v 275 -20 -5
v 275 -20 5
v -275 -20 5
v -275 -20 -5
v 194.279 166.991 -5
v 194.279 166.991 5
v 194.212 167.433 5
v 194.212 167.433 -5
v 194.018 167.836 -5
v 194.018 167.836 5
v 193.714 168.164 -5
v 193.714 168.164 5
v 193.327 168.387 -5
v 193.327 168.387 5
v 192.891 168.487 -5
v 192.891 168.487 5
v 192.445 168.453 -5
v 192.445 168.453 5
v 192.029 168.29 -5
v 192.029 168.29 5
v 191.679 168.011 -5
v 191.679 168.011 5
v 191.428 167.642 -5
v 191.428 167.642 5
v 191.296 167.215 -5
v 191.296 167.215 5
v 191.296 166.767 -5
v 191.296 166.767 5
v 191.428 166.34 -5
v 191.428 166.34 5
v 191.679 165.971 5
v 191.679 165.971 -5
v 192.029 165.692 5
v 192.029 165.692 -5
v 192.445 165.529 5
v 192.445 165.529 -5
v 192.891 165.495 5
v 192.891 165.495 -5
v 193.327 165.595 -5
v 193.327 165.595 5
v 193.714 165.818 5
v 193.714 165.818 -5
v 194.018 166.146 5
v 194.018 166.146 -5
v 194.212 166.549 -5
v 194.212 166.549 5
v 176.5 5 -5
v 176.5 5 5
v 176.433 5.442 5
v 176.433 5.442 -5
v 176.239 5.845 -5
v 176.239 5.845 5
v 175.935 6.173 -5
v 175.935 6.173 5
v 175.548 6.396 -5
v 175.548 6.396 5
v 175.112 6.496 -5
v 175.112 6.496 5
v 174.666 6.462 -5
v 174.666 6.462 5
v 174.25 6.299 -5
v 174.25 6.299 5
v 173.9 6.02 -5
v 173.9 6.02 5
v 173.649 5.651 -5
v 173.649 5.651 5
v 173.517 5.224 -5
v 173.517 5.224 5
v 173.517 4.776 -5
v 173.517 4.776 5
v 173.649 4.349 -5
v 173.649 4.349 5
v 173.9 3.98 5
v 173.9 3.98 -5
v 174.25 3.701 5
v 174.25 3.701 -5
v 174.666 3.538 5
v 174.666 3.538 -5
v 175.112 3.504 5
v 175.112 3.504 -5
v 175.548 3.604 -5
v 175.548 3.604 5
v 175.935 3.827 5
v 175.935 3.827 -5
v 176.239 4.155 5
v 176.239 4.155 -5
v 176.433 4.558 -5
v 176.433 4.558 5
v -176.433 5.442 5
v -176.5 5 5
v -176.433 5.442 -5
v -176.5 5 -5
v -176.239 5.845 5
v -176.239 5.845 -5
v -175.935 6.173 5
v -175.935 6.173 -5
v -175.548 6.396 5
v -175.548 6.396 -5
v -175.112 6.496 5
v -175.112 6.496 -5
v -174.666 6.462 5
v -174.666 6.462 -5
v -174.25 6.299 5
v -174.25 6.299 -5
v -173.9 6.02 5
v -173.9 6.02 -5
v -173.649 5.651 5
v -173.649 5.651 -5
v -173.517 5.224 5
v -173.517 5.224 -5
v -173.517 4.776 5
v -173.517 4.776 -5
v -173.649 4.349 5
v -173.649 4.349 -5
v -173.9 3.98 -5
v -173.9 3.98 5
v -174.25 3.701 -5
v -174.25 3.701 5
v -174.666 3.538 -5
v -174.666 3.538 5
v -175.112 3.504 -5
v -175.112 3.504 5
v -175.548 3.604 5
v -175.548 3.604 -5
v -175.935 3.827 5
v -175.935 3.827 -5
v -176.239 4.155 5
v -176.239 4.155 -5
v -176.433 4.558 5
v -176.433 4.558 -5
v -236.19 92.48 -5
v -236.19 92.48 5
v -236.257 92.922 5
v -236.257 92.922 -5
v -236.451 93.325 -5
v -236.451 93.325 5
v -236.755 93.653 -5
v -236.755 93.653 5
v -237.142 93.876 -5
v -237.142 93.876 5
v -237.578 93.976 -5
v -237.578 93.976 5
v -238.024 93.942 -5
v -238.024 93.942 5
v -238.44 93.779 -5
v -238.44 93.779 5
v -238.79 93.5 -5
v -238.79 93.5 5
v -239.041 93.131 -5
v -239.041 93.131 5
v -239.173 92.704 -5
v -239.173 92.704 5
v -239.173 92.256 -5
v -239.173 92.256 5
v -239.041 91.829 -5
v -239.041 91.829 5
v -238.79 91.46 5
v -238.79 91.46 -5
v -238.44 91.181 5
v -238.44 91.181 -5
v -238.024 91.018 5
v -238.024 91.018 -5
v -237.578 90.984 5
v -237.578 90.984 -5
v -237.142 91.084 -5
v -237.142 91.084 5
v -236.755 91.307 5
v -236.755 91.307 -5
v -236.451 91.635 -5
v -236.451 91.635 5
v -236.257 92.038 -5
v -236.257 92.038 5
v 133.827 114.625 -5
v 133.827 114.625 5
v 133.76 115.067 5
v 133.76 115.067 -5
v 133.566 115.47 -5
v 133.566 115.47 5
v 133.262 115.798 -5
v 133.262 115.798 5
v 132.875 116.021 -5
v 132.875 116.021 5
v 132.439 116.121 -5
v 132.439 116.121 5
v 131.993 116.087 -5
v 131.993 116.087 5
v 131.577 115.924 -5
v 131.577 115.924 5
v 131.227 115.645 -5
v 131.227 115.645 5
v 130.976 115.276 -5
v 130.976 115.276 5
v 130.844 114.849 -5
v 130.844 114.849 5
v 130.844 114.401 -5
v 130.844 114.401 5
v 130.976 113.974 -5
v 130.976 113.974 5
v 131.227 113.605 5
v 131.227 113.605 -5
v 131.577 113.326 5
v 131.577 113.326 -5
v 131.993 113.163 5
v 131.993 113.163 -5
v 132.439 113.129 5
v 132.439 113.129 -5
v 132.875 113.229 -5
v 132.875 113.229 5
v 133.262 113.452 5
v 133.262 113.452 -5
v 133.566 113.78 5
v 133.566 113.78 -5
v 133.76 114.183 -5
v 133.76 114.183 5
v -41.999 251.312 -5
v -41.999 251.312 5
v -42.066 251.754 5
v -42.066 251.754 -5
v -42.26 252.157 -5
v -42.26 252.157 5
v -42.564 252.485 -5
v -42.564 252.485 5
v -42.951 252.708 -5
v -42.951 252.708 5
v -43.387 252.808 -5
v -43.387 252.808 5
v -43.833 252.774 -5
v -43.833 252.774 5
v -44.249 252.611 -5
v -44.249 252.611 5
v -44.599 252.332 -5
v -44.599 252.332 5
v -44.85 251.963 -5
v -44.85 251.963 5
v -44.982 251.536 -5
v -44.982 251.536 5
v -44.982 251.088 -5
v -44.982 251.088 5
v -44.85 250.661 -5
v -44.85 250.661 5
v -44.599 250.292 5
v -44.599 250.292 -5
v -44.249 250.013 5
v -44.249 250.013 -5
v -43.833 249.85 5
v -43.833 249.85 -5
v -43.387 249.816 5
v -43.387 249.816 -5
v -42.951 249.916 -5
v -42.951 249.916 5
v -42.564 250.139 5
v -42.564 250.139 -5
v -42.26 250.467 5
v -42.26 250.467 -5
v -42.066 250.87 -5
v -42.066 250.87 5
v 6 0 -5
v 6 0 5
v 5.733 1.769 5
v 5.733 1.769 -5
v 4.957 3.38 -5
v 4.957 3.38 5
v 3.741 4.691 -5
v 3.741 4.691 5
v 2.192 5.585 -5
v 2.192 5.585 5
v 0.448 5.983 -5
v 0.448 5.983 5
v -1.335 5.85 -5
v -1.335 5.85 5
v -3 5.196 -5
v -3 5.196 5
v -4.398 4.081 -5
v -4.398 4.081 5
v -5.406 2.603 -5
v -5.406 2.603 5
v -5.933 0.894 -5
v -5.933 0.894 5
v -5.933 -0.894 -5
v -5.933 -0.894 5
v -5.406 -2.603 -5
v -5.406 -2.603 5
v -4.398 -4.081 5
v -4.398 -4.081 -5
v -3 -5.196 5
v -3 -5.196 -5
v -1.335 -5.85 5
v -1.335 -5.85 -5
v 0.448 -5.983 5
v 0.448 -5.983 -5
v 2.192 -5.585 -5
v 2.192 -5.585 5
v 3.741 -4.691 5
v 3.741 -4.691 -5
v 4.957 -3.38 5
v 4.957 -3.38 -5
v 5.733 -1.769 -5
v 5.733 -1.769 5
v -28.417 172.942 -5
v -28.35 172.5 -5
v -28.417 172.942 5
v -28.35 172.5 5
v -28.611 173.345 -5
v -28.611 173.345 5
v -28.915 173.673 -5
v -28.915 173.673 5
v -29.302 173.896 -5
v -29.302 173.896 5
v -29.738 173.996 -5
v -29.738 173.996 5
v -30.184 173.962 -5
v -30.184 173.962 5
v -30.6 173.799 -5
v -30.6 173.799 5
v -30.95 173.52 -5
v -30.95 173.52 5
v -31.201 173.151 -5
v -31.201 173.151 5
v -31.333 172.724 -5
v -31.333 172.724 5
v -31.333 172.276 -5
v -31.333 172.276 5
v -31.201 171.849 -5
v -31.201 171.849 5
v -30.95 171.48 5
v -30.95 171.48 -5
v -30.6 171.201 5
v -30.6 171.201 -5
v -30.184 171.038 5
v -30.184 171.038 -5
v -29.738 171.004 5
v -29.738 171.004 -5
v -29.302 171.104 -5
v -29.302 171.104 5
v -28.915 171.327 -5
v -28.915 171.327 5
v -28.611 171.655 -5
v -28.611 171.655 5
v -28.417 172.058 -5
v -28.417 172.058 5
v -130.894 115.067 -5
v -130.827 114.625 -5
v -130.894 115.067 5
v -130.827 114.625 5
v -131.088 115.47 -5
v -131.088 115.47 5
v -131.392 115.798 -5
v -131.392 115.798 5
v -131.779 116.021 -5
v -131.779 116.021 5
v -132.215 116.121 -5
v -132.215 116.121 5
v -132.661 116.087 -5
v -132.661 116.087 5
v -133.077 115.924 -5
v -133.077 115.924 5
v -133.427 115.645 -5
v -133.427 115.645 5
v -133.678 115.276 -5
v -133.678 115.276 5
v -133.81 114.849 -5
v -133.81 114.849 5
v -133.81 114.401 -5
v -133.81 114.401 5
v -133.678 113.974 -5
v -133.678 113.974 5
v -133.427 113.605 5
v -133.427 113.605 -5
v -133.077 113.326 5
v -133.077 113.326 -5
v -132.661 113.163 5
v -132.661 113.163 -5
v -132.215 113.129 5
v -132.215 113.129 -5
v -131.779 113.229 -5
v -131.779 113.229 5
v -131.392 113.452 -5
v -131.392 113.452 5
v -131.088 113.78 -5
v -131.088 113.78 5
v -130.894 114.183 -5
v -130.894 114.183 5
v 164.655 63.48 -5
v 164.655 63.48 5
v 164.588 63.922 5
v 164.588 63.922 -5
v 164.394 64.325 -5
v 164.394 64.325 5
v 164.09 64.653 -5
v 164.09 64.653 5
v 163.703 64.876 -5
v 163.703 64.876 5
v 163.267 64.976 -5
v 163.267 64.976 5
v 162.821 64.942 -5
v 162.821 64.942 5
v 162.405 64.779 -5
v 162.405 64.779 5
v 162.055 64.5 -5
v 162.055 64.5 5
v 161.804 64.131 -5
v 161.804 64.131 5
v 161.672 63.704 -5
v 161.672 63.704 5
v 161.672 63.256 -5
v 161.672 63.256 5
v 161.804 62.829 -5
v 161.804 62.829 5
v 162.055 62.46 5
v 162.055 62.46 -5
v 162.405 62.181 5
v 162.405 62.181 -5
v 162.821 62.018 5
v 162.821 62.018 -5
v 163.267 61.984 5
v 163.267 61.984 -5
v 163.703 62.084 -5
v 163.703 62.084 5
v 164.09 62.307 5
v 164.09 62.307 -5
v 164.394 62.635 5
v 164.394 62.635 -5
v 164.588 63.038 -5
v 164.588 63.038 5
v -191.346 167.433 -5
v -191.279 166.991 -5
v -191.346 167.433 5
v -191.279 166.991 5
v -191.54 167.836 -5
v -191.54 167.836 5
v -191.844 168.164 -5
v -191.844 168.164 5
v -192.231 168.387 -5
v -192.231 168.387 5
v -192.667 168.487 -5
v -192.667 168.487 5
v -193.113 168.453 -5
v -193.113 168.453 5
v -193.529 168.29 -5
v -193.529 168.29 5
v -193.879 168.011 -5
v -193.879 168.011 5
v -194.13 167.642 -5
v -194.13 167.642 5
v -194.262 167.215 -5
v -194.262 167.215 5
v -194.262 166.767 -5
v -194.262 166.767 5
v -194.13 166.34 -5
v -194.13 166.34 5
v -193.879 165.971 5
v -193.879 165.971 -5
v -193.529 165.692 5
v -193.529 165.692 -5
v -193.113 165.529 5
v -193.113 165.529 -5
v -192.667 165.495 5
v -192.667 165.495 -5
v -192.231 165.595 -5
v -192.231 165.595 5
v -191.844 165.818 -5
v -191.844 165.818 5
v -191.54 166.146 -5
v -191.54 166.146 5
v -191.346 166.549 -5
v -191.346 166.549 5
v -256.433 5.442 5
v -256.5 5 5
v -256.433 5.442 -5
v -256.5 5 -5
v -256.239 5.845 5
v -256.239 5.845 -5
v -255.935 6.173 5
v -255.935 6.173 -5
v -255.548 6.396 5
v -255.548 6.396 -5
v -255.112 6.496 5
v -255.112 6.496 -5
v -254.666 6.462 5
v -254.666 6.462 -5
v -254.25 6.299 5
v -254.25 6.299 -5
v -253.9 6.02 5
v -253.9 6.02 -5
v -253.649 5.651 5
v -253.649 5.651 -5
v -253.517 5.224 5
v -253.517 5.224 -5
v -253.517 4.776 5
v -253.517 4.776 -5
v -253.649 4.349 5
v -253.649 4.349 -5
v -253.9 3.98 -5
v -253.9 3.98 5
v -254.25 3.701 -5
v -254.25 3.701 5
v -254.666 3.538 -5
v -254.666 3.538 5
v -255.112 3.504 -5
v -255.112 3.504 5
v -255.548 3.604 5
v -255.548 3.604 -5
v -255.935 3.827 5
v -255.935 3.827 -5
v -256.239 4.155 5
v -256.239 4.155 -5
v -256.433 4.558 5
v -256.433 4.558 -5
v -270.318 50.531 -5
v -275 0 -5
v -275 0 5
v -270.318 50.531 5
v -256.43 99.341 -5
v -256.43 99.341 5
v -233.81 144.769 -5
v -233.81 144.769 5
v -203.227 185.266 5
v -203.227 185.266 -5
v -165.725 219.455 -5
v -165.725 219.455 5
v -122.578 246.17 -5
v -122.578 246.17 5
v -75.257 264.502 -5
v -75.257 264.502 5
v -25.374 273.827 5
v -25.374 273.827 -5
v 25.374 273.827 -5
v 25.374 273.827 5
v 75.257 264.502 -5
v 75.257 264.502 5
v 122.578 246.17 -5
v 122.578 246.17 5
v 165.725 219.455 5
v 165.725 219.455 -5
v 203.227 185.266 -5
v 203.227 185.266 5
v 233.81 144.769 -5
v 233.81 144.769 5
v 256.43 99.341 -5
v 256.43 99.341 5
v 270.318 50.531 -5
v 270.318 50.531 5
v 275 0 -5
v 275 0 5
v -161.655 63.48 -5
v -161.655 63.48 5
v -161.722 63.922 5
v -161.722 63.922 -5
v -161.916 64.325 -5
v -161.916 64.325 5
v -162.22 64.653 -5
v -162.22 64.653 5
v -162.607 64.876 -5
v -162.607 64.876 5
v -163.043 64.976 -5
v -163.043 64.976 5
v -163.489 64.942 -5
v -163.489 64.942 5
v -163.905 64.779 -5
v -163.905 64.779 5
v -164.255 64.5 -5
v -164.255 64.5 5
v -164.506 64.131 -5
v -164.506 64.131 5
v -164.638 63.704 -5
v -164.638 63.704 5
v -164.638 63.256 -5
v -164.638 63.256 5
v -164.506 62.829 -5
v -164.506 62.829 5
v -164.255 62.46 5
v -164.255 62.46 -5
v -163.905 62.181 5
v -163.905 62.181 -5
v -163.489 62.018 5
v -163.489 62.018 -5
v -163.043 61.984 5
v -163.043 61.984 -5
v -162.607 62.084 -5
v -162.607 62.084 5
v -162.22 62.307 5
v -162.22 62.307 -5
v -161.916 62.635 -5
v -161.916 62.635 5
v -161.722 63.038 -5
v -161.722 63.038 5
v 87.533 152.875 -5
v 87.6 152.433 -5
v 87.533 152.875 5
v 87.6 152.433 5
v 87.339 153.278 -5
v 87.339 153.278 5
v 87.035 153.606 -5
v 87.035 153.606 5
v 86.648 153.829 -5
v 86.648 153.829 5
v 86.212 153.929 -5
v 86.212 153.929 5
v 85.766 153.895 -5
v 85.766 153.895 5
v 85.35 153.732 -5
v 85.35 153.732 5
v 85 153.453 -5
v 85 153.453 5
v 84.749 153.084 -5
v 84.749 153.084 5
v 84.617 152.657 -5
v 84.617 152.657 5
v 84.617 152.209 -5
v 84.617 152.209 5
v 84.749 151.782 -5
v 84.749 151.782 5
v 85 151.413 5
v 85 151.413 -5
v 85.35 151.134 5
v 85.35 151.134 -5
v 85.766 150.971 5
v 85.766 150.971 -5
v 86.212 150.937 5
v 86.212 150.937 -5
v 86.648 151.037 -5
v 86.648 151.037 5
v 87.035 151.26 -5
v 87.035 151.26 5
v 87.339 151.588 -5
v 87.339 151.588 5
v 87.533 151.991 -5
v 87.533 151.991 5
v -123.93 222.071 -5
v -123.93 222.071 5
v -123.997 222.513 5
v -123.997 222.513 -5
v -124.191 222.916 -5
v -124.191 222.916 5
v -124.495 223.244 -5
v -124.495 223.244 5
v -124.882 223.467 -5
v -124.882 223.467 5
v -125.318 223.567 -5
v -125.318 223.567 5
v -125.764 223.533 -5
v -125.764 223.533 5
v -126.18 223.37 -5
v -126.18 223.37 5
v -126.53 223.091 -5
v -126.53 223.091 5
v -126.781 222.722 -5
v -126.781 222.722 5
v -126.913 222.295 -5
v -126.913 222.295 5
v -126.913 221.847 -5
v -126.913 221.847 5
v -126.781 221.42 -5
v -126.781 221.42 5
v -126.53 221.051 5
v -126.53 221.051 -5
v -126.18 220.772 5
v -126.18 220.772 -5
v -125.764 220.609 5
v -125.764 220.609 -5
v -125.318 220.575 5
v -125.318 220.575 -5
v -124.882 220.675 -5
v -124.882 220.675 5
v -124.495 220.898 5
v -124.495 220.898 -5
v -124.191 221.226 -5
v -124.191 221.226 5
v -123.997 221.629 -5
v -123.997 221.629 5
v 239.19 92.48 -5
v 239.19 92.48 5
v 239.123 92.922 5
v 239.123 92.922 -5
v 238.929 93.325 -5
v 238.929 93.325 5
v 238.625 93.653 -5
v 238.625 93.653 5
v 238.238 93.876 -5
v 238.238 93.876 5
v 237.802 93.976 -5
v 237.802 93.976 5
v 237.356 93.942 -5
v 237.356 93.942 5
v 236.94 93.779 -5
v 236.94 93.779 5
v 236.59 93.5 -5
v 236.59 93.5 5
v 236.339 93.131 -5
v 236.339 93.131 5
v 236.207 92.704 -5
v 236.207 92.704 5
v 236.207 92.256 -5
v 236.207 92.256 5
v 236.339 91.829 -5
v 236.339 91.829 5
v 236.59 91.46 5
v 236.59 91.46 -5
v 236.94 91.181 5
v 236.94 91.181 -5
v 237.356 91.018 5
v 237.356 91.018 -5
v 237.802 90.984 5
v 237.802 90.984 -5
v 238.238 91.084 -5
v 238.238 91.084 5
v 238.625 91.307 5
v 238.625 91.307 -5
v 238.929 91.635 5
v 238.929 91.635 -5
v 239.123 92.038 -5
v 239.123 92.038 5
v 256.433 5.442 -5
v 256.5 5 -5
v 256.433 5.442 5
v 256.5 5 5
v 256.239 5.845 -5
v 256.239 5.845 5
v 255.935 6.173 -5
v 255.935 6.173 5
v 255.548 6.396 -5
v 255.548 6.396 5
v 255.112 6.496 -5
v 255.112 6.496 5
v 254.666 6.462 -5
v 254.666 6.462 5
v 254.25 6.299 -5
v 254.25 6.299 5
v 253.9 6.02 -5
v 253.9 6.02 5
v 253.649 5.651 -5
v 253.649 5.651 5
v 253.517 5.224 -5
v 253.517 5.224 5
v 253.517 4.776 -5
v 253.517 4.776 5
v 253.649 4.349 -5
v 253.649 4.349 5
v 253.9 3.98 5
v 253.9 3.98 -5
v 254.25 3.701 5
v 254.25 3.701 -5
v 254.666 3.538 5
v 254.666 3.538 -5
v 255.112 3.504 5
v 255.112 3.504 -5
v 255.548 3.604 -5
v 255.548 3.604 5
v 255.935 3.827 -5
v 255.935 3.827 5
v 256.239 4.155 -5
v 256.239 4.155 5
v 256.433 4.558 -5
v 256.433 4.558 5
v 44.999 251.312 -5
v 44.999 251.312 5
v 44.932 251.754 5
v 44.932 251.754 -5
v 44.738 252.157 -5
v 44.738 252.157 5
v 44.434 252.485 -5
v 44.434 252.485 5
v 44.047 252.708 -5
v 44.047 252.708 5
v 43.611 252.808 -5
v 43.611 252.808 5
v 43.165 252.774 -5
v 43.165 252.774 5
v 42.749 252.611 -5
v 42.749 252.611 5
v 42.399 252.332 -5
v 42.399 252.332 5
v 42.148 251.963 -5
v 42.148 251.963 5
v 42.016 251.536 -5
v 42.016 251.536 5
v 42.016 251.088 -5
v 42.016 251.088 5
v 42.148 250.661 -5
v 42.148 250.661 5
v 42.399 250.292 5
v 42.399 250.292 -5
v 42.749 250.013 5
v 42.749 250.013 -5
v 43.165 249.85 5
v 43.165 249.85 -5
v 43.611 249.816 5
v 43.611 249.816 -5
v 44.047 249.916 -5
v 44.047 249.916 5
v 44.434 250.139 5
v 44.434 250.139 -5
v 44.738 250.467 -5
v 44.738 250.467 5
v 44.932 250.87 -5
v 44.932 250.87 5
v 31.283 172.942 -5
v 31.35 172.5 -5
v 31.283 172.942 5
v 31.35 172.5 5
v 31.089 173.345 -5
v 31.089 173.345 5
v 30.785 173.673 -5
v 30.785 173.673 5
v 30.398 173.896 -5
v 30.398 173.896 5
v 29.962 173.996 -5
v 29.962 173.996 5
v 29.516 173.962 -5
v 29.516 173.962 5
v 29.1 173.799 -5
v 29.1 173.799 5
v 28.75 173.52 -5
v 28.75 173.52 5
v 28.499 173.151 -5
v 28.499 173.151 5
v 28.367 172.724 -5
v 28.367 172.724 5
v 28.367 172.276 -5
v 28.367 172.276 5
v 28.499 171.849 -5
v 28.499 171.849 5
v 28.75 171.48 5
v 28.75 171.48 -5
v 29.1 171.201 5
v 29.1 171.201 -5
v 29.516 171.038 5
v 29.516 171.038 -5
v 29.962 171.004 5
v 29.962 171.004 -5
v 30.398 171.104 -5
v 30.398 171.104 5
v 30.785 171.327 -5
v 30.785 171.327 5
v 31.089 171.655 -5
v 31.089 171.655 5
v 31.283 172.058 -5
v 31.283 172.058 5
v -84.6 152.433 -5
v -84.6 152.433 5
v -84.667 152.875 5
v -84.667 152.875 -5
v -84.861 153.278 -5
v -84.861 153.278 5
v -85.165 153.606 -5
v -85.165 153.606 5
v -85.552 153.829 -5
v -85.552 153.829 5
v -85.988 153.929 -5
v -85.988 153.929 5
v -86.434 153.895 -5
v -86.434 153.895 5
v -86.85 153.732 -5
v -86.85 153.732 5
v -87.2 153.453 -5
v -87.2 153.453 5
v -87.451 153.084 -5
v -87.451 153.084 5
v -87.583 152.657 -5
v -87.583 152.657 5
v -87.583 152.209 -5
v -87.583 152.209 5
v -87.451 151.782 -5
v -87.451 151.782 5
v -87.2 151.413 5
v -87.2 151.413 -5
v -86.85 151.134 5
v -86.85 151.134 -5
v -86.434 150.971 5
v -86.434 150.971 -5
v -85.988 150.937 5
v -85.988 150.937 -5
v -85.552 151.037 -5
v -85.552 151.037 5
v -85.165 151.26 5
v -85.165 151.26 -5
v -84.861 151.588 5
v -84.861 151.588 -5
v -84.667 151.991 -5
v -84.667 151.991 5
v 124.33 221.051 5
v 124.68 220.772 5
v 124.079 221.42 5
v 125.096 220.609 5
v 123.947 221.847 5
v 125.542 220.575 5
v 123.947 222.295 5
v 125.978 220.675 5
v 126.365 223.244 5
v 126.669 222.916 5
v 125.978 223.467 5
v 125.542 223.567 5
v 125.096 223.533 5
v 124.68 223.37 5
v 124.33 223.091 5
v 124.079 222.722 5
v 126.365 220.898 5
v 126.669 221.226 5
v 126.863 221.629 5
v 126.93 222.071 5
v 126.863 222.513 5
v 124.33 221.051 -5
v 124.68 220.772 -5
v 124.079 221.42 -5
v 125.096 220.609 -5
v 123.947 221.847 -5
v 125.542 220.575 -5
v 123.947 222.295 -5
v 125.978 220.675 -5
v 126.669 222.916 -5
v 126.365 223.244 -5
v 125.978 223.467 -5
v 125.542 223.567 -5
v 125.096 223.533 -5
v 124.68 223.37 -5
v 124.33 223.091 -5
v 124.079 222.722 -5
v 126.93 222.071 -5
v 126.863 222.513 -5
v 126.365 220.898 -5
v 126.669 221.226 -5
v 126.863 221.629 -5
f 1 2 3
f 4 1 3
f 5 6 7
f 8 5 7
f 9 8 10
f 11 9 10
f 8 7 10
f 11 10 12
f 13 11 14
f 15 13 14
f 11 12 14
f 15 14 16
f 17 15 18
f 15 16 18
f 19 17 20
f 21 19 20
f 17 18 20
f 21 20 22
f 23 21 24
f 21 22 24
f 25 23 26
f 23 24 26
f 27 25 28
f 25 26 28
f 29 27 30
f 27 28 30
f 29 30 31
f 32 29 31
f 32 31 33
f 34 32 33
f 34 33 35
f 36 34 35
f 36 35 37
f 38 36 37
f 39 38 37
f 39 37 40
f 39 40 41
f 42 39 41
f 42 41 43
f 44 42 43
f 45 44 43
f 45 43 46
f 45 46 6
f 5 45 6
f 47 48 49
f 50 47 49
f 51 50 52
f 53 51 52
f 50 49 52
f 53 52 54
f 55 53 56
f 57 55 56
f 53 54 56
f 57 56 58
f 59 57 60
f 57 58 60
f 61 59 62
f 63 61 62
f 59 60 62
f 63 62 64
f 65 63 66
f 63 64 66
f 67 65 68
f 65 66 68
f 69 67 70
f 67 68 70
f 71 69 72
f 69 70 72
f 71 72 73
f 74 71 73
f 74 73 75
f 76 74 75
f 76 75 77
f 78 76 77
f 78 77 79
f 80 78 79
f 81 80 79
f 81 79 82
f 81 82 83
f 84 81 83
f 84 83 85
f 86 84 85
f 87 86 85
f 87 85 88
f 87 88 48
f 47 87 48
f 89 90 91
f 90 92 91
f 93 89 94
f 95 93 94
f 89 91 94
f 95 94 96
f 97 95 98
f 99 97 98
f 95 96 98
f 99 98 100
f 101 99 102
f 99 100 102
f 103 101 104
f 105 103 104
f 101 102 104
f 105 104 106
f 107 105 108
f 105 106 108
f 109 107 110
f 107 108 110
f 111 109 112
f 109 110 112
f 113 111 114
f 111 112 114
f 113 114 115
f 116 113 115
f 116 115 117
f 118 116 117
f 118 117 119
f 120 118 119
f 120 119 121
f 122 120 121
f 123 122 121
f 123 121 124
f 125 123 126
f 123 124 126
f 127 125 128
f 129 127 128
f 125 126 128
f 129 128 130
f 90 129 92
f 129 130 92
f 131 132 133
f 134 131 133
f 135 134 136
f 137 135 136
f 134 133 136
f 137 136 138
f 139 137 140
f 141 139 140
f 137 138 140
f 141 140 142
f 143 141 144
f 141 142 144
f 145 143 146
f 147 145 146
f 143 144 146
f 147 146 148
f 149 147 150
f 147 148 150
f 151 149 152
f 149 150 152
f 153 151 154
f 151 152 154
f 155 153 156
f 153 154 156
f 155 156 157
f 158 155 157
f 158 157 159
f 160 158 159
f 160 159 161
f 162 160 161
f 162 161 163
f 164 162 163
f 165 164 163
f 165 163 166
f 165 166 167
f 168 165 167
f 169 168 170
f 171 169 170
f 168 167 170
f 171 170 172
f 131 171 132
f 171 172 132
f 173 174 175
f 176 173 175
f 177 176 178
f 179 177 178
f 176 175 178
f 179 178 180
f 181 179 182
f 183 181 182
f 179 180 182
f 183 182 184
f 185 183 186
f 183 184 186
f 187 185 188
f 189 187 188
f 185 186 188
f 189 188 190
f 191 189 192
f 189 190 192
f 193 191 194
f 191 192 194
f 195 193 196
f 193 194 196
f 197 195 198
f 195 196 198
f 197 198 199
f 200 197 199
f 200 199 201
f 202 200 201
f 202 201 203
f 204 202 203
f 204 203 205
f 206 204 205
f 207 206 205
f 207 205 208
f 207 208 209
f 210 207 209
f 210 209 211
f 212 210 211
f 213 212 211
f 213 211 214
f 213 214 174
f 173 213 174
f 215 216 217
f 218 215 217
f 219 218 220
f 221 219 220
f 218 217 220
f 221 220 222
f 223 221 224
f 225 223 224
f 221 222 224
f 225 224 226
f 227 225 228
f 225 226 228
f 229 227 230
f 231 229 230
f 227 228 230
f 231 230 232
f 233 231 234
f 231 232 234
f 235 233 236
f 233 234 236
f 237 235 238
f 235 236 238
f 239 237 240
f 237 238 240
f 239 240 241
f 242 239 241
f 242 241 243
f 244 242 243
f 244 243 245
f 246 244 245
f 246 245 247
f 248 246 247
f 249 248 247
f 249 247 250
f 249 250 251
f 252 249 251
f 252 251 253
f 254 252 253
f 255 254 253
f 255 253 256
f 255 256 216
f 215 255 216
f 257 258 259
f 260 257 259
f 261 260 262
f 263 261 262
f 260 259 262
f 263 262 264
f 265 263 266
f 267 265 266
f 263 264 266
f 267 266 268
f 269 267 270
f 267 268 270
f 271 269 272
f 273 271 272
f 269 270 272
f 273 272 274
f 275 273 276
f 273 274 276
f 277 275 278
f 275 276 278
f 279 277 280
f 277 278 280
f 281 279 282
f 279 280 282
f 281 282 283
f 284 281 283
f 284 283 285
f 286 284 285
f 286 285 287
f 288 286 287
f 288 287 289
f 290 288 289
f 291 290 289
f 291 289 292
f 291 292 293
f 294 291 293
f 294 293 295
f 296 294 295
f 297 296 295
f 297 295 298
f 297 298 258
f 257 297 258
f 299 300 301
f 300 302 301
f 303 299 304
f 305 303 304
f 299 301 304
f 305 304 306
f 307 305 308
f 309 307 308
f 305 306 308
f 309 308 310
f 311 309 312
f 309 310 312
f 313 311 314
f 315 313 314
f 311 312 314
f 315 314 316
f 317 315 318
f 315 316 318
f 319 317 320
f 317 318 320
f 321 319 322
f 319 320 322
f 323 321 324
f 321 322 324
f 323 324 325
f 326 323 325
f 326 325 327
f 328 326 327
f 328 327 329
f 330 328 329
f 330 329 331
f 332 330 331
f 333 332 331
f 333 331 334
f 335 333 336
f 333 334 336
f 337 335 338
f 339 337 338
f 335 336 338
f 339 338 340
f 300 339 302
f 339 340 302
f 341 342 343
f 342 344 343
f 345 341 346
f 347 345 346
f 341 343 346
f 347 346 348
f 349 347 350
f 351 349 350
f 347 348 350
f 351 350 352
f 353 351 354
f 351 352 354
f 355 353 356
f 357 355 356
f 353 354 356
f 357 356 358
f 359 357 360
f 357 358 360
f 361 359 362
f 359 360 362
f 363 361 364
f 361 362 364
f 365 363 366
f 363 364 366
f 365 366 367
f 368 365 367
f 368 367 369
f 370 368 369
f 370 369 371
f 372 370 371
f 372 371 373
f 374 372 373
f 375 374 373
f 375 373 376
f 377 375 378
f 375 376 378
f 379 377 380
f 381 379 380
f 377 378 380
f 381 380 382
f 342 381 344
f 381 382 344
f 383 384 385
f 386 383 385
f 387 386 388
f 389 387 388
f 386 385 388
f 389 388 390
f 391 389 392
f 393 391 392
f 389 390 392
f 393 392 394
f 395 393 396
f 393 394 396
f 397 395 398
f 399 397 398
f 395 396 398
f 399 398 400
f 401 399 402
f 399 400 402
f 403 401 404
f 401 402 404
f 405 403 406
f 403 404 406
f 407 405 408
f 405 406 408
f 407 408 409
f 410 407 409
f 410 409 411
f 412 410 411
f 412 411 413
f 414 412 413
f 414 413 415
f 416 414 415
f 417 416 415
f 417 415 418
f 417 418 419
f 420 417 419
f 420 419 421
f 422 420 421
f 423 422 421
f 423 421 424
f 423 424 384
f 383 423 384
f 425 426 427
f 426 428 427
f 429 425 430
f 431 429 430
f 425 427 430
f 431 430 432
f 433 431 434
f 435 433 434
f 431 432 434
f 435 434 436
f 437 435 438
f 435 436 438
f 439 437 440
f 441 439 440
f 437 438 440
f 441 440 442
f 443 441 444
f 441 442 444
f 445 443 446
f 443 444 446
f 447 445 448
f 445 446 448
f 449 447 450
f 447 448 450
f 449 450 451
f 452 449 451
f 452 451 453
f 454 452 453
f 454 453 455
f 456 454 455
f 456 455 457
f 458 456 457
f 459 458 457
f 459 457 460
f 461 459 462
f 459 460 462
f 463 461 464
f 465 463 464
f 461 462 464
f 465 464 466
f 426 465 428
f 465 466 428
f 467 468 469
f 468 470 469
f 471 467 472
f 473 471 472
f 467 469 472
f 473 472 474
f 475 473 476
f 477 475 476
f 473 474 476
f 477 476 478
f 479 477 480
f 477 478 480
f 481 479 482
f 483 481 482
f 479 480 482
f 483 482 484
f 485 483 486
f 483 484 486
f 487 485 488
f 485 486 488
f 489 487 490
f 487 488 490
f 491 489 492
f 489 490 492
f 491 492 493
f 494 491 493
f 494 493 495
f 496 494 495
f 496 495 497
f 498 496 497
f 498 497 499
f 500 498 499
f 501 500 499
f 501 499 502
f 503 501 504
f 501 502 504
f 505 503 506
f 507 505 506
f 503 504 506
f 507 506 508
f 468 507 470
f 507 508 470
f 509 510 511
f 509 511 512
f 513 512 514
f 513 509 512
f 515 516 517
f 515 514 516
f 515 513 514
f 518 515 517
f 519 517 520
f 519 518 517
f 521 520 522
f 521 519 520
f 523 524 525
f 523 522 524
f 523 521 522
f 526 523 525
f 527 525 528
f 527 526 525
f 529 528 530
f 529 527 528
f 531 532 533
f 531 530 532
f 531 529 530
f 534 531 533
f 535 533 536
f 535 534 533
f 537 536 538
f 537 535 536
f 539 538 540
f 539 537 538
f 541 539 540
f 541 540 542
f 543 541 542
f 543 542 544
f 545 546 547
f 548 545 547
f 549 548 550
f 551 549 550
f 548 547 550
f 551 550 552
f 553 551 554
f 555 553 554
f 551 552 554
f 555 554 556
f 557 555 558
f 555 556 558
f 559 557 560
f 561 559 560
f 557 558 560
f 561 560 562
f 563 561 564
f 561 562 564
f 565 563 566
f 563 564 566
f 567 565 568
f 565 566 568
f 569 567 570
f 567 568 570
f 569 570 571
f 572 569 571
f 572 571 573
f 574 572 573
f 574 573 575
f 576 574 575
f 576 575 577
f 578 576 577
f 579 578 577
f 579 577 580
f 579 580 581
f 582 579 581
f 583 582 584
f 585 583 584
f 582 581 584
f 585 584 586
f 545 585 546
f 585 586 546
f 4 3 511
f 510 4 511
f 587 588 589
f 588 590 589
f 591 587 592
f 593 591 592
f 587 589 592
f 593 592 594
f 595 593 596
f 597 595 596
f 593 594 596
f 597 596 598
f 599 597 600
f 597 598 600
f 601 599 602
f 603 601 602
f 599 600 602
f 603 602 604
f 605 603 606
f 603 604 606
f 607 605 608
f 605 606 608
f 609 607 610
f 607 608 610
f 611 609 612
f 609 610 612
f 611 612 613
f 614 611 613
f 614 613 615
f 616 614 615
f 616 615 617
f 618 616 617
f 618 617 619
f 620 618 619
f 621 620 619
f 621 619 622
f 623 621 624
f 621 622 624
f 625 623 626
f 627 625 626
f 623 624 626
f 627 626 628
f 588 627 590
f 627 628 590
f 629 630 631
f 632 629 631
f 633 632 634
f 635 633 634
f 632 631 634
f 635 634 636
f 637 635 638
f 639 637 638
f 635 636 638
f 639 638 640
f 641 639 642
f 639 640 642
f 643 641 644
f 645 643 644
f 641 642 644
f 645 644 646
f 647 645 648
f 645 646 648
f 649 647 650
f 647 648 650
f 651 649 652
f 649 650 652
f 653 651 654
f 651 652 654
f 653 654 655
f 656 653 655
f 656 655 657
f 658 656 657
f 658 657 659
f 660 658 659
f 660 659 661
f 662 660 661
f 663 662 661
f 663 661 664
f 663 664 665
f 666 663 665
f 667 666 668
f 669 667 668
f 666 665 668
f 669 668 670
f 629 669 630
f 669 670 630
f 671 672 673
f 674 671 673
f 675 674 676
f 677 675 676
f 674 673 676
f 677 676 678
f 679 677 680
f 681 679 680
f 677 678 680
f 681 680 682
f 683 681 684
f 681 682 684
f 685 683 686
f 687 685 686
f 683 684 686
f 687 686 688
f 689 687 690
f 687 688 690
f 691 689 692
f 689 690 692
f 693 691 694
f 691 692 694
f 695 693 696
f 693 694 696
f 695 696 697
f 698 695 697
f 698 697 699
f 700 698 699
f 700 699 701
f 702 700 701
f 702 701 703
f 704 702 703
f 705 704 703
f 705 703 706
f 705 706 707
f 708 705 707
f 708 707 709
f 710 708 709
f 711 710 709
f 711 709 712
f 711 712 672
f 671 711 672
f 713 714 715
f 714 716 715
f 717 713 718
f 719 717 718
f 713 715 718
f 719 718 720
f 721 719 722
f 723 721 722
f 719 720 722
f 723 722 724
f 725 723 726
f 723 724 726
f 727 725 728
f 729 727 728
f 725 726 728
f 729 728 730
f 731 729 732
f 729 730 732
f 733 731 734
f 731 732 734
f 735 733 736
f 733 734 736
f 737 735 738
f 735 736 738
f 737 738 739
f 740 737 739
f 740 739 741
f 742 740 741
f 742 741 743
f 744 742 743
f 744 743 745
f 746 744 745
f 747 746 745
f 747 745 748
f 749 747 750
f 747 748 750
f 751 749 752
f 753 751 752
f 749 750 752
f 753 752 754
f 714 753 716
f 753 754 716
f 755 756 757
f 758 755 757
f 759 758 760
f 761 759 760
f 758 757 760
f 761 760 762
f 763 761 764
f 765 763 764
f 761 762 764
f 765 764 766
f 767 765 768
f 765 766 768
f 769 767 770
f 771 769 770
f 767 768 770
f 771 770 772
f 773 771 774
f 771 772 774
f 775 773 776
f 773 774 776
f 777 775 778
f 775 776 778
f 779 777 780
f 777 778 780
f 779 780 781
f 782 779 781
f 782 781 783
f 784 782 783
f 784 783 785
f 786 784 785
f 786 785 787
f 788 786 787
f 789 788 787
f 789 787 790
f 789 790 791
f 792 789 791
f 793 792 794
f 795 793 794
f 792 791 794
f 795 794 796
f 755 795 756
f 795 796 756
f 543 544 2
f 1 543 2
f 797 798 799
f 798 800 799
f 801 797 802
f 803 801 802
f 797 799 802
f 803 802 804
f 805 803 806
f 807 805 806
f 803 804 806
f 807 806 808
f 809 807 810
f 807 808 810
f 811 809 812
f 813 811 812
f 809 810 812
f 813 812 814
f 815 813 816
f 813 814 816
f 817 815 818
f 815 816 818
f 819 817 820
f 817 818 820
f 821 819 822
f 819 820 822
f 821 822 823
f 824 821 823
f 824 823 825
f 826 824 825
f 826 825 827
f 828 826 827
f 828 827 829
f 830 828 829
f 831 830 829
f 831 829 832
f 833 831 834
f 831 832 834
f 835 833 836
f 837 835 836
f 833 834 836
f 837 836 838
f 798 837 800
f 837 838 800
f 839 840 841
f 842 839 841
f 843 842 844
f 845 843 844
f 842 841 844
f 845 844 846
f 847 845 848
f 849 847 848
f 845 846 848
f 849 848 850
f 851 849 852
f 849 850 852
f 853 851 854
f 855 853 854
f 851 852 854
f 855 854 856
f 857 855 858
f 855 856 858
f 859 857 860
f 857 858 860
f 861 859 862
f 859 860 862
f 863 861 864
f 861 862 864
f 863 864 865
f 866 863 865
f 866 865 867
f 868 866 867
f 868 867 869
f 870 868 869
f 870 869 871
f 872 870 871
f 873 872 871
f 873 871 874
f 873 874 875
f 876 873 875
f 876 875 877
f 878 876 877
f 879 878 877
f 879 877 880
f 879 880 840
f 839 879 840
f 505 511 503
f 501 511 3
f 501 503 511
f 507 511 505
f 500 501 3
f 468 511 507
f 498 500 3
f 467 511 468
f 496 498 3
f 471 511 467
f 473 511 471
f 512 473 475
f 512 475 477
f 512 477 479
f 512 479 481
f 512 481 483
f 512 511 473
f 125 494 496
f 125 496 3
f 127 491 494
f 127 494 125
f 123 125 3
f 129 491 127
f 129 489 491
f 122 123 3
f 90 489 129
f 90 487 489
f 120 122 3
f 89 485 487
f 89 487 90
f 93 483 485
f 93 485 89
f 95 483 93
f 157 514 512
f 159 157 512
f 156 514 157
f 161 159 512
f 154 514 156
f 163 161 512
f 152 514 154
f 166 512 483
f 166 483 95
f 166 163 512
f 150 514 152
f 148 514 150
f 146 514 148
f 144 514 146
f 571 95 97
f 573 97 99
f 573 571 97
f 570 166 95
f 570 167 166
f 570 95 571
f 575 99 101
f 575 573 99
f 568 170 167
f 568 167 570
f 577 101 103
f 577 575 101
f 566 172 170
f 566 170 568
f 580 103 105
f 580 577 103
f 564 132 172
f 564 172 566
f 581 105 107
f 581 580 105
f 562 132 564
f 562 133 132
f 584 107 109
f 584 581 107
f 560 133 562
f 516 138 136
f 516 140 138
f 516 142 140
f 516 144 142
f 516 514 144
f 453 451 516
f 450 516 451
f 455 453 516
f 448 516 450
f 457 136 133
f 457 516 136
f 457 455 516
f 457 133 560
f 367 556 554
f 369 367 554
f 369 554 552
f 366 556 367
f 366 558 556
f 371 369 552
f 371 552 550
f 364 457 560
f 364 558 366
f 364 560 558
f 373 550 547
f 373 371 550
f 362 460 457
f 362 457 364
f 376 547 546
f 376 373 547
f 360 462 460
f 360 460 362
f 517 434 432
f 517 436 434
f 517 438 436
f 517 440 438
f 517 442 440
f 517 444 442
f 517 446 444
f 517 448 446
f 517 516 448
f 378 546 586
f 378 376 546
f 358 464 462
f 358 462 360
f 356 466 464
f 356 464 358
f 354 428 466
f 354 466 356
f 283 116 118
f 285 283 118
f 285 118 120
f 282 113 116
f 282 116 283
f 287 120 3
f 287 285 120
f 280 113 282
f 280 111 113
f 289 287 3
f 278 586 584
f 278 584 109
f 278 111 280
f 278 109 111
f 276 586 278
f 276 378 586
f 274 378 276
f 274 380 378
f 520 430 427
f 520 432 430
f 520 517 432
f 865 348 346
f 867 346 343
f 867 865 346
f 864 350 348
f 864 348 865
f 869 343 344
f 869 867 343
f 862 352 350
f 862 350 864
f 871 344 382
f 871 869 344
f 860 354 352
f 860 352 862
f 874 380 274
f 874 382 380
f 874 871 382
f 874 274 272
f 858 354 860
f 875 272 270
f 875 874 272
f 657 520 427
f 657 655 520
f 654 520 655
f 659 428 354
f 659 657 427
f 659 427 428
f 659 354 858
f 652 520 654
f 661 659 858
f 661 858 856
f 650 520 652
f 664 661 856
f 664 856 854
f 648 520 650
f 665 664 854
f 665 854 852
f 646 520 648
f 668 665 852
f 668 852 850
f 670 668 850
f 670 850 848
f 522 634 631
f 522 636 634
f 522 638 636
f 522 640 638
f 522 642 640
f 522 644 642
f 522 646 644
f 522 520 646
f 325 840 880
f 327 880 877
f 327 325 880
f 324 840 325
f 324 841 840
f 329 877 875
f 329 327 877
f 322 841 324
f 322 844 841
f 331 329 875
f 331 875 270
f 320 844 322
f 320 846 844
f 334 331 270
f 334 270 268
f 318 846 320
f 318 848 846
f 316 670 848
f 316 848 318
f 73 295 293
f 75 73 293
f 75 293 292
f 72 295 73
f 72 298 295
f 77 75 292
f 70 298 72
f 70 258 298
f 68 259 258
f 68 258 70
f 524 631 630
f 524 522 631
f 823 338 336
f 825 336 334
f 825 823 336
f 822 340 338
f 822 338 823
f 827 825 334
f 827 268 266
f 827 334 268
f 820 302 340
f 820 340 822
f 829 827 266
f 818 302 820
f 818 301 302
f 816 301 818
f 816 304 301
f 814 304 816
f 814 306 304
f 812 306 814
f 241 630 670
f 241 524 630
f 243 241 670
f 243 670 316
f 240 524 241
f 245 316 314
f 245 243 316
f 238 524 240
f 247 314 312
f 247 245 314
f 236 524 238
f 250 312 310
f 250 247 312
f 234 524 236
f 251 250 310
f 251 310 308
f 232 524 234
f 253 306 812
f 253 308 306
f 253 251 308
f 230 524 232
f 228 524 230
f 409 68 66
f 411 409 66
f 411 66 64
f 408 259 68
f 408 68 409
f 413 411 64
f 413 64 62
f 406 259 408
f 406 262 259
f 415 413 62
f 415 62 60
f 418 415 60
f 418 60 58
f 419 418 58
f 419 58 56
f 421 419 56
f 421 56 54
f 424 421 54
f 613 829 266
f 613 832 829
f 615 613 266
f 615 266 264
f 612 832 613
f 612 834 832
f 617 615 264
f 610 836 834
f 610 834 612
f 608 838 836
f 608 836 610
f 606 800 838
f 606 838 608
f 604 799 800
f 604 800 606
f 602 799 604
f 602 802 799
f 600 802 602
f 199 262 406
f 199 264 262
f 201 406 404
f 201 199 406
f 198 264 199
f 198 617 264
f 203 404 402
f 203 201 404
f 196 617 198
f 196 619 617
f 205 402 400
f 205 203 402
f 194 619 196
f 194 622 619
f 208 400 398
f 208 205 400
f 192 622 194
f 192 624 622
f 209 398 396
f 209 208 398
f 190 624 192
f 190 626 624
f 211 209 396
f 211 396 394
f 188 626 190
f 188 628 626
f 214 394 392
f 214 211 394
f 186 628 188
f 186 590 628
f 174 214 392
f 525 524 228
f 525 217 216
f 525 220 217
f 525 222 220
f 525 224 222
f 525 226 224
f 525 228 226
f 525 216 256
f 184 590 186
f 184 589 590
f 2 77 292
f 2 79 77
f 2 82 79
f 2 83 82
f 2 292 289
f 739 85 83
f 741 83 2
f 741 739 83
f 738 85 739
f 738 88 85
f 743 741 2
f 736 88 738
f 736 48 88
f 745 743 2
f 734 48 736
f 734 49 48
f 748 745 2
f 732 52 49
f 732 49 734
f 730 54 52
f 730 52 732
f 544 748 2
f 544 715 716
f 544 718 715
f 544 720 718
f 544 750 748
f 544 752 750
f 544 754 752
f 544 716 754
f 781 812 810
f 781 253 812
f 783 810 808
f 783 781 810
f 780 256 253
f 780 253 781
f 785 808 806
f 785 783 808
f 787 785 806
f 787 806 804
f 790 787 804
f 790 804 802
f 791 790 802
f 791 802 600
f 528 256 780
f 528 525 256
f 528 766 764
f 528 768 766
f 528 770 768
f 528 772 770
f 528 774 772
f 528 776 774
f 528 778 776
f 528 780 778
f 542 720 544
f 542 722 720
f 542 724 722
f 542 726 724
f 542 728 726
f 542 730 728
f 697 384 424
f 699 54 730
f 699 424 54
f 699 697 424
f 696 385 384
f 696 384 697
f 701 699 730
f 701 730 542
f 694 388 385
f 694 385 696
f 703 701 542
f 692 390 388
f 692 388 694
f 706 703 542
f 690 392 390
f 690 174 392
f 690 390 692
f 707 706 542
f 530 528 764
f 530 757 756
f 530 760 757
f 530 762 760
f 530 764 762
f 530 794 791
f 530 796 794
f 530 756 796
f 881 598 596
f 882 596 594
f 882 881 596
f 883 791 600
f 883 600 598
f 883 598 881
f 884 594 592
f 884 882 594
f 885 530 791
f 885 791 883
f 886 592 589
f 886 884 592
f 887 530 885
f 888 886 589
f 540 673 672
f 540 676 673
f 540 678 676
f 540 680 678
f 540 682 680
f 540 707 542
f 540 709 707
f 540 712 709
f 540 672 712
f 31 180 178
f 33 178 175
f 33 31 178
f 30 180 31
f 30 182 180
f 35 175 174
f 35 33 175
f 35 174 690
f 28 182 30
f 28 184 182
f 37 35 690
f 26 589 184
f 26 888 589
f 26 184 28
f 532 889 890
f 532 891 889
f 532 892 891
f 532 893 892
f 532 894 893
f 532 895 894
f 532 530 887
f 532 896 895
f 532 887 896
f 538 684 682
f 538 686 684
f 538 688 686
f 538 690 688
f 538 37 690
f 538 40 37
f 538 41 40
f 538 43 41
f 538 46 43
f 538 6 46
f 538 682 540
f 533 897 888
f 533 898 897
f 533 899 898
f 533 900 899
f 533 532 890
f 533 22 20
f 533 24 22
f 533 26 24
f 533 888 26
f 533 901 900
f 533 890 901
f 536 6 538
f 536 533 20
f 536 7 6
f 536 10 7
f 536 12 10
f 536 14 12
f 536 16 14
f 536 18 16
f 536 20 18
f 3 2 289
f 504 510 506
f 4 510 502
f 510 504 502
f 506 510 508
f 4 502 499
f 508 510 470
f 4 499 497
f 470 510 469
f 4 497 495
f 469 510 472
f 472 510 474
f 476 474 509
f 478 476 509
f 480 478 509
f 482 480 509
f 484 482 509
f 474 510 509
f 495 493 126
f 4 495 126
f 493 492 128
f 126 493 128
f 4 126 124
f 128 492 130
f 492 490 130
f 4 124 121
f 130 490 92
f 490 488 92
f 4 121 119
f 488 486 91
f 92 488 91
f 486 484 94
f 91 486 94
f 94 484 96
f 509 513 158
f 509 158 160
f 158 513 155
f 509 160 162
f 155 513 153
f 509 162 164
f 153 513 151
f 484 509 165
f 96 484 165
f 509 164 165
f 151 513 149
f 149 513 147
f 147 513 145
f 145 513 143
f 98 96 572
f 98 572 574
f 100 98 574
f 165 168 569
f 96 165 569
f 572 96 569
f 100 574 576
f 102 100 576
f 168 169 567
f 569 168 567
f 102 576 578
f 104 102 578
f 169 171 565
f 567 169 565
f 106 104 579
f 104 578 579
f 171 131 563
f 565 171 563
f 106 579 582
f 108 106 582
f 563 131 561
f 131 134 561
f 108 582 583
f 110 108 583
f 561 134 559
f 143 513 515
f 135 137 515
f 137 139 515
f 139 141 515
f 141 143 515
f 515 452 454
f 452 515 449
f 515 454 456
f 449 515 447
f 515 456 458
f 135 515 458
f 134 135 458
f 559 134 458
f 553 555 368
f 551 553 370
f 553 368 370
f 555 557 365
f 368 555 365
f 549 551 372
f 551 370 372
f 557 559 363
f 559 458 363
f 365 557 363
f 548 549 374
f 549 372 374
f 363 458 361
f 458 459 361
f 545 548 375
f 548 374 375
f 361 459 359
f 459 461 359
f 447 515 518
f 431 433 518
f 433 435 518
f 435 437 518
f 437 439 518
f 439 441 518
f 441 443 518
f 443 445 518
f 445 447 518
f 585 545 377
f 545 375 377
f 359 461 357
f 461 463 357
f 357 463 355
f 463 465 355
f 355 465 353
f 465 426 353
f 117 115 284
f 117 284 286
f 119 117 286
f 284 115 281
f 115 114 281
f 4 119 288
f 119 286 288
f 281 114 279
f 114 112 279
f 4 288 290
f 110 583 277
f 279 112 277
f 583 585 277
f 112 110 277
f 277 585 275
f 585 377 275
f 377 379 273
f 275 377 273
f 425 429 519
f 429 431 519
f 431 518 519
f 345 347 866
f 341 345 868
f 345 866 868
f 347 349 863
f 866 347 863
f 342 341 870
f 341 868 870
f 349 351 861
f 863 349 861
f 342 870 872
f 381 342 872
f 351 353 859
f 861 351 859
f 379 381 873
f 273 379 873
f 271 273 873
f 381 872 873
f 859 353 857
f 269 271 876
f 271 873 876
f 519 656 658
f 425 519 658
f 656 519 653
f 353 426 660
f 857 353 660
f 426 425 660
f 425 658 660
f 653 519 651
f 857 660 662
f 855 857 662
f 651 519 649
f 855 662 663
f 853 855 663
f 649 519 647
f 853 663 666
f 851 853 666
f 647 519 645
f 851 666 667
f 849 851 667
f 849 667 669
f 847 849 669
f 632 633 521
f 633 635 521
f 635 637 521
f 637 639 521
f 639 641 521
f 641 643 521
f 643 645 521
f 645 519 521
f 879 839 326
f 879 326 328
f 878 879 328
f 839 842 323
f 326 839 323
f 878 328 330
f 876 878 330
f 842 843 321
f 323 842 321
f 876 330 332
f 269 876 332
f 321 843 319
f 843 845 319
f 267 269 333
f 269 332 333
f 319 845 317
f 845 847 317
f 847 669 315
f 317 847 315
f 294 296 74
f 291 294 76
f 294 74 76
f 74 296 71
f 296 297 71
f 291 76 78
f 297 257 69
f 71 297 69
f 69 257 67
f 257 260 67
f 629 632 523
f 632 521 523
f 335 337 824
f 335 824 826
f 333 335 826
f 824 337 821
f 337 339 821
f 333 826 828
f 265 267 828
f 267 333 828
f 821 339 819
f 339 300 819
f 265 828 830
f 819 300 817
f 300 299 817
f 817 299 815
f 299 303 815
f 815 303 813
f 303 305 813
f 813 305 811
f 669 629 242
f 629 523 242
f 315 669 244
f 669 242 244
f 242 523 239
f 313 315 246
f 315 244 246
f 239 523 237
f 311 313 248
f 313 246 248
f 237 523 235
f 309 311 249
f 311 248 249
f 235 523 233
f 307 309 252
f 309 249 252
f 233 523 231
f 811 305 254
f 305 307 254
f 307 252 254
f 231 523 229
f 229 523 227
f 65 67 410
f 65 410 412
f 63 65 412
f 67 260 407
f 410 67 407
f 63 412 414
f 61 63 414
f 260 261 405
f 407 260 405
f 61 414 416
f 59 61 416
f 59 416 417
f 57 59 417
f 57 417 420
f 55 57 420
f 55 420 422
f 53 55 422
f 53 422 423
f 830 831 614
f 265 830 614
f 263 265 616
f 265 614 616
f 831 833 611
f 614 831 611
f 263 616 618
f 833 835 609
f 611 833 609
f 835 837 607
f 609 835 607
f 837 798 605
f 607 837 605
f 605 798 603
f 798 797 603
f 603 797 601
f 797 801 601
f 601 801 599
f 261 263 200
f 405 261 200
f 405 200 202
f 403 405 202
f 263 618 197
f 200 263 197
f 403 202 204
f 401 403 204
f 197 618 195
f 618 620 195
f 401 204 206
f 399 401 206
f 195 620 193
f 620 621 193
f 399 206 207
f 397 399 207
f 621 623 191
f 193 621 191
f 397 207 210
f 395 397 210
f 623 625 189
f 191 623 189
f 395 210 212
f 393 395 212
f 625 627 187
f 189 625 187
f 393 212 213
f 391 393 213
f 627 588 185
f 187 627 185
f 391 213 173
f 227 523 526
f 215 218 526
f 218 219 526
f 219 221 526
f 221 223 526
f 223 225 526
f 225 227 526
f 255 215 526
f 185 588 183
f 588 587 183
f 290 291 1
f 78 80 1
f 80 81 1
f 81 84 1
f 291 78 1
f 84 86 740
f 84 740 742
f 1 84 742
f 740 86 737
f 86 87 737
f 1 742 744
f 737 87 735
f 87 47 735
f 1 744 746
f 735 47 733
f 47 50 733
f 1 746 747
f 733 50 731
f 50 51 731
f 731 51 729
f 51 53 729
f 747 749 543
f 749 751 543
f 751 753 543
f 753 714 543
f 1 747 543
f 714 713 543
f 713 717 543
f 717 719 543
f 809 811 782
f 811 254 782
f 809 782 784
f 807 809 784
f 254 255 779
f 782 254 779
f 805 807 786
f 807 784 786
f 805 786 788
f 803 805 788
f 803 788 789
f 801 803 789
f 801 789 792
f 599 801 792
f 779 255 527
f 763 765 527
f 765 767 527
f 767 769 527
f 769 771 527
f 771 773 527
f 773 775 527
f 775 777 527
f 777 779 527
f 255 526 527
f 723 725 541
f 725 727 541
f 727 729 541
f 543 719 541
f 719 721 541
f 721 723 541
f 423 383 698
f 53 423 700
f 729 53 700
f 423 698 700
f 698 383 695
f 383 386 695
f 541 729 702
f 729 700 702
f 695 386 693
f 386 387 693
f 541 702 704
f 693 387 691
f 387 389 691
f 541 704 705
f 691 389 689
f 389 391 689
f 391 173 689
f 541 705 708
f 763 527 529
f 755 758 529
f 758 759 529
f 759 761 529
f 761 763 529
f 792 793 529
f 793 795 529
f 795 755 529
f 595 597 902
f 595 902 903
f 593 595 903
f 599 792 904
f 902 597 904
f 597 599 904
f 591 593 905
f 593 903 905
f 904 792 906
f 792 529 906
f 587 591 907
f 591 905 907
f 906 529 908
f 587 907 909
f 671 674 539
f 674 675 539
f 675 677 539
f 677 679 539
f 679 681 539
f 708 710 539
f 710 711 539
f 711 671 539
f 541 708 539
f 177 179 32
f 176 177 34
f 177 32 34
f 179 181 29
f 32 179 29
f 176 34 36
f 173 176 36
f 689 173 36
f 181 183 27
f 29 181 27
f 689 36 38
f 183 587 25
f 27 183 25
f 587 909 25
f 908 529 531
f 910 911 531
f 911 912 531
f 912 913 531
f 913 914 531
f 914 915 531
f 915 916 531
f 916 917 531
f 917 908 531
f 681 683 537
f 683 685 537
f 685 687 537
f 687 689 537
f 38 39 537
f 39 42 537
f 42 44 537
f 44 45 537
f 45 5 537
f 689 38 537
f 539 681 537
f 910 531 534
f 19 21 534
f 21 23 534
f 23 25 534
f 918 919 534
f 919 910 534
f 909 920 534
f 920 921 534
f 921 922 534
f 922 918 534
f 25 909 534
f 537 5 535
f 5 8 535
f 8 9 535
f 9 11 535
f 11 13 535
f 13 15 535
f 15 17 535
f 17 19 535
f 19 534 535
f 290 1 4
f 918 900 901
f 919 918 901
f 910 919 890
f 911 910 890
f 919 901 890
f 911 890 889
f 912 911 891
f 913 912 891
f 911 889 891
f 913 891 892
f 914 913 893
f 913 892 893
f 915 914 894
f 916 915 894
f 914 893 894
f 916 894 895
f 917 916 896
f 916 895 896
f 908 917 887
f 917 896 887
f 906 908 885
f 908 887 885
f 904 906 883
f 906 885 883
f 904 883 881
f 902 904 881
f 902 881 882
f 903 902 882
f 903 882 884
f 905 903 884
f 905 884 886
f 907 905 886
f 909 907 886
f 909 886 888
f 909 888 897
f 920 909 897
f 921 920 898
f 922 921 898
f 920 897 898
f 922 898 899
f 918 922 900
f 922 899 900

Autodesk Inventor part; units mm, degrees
ref_plane "YZ Plane" through (0, 0, 0) normal (1, 0, 0) x (0, 1, 0)
ref_plane "XZ Plane" through (0, 0, 0) normal (0, 1, 0) x (-1, 0, 0)
ref_plane "XY Plane" through (0, 0, 0) normal (0, 0, 1) x (1, 0, 0)
sketch "Esquisse1" plane through (0, 0, 0) normal (0, 0, 1) x (1, 0, 0)
  circle A0 centre (0, 0) radius 155
  circle A1 centre (0, 0) radius 275
  line L0 (-275, 0) -> (275, 0)
  line L1 (-155, 0) -> (155, 0)
  circle A2 centre (-175, 5) radius 1.5
  circle A3 centre (175, 5) radius 1.5
  point P0 (-86.6478, -260.9927)
  point P1 (93.3373, -258.6758)
  dimension "d0" = 310
  dimension "d1" = 550
  dimension "d2" = 180
  dimension "d5" = 179.9851
  dimension "d6" = 5
  dimension "d7" = -175
  dimension "d8" = 3
  dimension "d19" = 5
  dimension "d20" = 175
  dimension "d21" = 3
extrude "Extrusion1" add sketch "Esquisse1" along normal mid plane 10 contours L0 A0 | A0 L0 A1 | A2 | A3 picked at (36.5339, 36.5339) picked at (197.6975, 36.6731)
sketch "Esquisse2" plane through (0, 0, 5) normal (0, 0, 1) x (-1, 0, 0)
  arc A0 (-275, 0) -> (275, 0) centre (0, 0) ccw projected
  line L0 (-275, 0) -> (275, 0)
sketch "Esquisse3" plane through (0, 0, -5) normal (0, 0, -1) x (-1, 0, 0)
  circle A0 centre (175, 5) radius 1.5
  line L0 (275, 0) -> (-275, 0) projected
  point P0 (0, 0)
  point P1 (155, 0)
  dimension "d9" = 175
  dimension "d10" = 5
  dimension "d11" = 3
extrude "Extrusion2" cut sketch "Esquisse3" against normal blind 10
sketch "Esquisse4" plane through (0, 0, -5) normal (0, 0, -1) x (-1, 0, 0)
  circle A0 centre (255, 5) radius 1.5
  line L0 (-275, 0) -> (275, 0) projected
  point P0 (0, 0)
  point P1 (155, 0)
  dimension "d14" = 5
  dimension "d15" = 255
  dimension "d16" = 3
extrude "Extrusion3" cut sketch "Esquisse4" against normal blind 10
sketch "Esquisse5" plane through (0, 0, 5) normal (0, 0, 1) x (1, 0, 0)
  circle A0 centre (175, 5) radius 1.5
  line L0 (-275, 0) -> (275, 0) projected
  circle A1 centre (255, 5) radius 1.5
  point P0 (0, 0)
  point P1 (0, 0)
  point P2 (0, 0)
  dimension "d22" = 5
  dimension "d23" = 3
  dimension "d24" = 175
  dimension "d25" = 255
  dimension "d26" = 3
extrude "Extrusion4" cut sketch "Esquisse5" against normal blind 10 contours A0
sketch "Esquisse6" plane through (0, 0, 5) normal (0, 0, 1) x (1, 0, 0)
  circle A0 centre (255, 5) radius 1.5
  line L0 (-275, 0) -> (275, 0) projected
  point P0 (0, 0)
  point P1 (0, 0)
  dimension "d31" = 5
  dimension "d32" = 255
  dimension "d33" = 3
extrude "Extrusion6" cut sketch "Esquisse6" against normal blind 10
sketch "Esquisse7" plane through (0, 0, 5) normal (0, 0, 1) x (1, 0, 0)
  circle A0 centre (163.155, 63.48) radius 1.5
  line L0 (-275, 0) -> (275, 0) projected
  circle A1 centre (237.69, 92.48) radius 1.5
  point P0 (0, 0)
  point P1 (0, 0)
  point P2 (0, 0)
  dimension "d37" = 3
  dimension "d38" = 63.48
  dimension "d39" = 163.155
  dimension "d40" = 92.48
  dimension "d41" = 237.69
  dimension "d42" = 3
extrude "Extrusion7" cut sketch "Esquisse7" against normal blind 10
sketch "Esquisse8" plane through (0, 0, 5) normal (0, 0, 1) x (1, 0, 0)
  circle A0 centre (132.327, 114.625) radius 1.5
  line L0 (-275, 0) -> (275, 0) projected
  circle A1 centre (192.779, 166.991) radius 1.5
  circle A2 centre (86.1, 152.433) radius 1.5
  circle A3 centre (125.43, 222.071) radius 1.5
  circle A4 centre (29.85, 172.5) radius 1.5
  circle A5 centre (43.499, 251.312) radius 1.5
  line L1 (0, 0) -> (0, 275.6506)
  dimension "d45" = 114.625
  dimension "d46" = 132.327
  dimension "d47" = 3
  dimension "d48" = 166.991
  dimension "d49" = 192.779
  dimension "d50" = 3
  dimension "d51" = 152.433
  dimension "d52" = 86.1
  dimension "d53" = 3
  dimension "d54" = 222.071
  dimension "d55" = 125.43
  dimension "d56" = 3
  dimension "d57" = 172.5
  dimension "d58" = 29.85
  dimension "d59" = 3
  dimension "d60" = 251.312
  dimension "d61" = 43.499
  dimension "d62" = 3
extrude "Extrusion8" cut sketch "Esquisse8" against normal blind 10
sketch "Esquisse9" plane through (0, 0, 5) normal (0, 0, 1) x (1, 0, 0)
  circle A0 centre (-163.155, 63.48) radius 1.5
  circle A1 centre (-237.69, 92.48) radius 1.5
  circle A2 centre (-132.327, 114.625) radius 1.5
  circle A3 centre (-192.779, 166.991) radius 1.5
  circle A4 centre (-86.1, 152.433) radius 1.5
  circle A5 centre (-125.43, 222.071) radius 1.5
  circle A6 centre (-29.85, 172.5) radius 1.5
  circle A7 centre (-43.499, 251.312) radius 1.5
  line L0 (-275, 0) -> (275, 0) projected
  point P0 (0, 0)
  point P1 (0, 0)
  point P2 (0, 0)
  point P3 (0, 0)
  point P4 (0, 0)
  point P5 (0, 0)
  point P6 (0, 0)
  point P7 (0, 0)
  point P8 (0, 0)
  dimension "d65" = 63.48
  dimension "d66" = 163.155
  dimension "d67" = 3
  dimension "d68" = 92.48
  dimension "d69" = 237.69
  dimension "d70" = 3
  dimension "d71" = 132.327
  dimension "d72" = 114.625
  dimension "d73" = 3
  dimension "d74" = 166.991
  dimension "d75" = 192.779
  dimension "d76" = 3
  dimension "d77" = 152.433
  dimension "d78" = 86.1
  dimension "d79" = 3
  dimension "d80" = 125.43
  dimension "d81" = 222.071
  dimension "d82" = 3
  dimension "d83" = 29.85
  dimension "d84" = 172.5
  dimension "d85" = 3
  dimension "d86" = 43.499
  dimension "d87" = 251.312
  dimension "d88" = 3
extrude "Extrusion9" cut sketch "Esquisse9" against normal blind 10
sketch "Esquisse11" plane through (0, 0, 5) normal (0, 0, 1) x (1, 0, 0)
  line L0 (275, 0) -> (-275, 0) projected
  line L1 (-275, 0) -> (275, 0)
  line L2 (275, 0) -> (275, -20)
  line L3 (275, -20) -> (-275, -20)
  line L4 (-275, -20) -> (-275, 0)
  point P0 (0, 0)
  dimension "d91" = 20
extrude "Extrusion10" add sketch "Esquisse11" against normal blind 10
sketch "Esquisse12" plane through (0, 0, 5) normal (0, 0, 1) x (1, 0, 0)
  circle A0 centre (0, 0) radius 6
  dimension "d94" = 12
extrude "Extrusion11" cut sketch "Esquisse12" against normal blind 10
properties part number "plaque dessus"
